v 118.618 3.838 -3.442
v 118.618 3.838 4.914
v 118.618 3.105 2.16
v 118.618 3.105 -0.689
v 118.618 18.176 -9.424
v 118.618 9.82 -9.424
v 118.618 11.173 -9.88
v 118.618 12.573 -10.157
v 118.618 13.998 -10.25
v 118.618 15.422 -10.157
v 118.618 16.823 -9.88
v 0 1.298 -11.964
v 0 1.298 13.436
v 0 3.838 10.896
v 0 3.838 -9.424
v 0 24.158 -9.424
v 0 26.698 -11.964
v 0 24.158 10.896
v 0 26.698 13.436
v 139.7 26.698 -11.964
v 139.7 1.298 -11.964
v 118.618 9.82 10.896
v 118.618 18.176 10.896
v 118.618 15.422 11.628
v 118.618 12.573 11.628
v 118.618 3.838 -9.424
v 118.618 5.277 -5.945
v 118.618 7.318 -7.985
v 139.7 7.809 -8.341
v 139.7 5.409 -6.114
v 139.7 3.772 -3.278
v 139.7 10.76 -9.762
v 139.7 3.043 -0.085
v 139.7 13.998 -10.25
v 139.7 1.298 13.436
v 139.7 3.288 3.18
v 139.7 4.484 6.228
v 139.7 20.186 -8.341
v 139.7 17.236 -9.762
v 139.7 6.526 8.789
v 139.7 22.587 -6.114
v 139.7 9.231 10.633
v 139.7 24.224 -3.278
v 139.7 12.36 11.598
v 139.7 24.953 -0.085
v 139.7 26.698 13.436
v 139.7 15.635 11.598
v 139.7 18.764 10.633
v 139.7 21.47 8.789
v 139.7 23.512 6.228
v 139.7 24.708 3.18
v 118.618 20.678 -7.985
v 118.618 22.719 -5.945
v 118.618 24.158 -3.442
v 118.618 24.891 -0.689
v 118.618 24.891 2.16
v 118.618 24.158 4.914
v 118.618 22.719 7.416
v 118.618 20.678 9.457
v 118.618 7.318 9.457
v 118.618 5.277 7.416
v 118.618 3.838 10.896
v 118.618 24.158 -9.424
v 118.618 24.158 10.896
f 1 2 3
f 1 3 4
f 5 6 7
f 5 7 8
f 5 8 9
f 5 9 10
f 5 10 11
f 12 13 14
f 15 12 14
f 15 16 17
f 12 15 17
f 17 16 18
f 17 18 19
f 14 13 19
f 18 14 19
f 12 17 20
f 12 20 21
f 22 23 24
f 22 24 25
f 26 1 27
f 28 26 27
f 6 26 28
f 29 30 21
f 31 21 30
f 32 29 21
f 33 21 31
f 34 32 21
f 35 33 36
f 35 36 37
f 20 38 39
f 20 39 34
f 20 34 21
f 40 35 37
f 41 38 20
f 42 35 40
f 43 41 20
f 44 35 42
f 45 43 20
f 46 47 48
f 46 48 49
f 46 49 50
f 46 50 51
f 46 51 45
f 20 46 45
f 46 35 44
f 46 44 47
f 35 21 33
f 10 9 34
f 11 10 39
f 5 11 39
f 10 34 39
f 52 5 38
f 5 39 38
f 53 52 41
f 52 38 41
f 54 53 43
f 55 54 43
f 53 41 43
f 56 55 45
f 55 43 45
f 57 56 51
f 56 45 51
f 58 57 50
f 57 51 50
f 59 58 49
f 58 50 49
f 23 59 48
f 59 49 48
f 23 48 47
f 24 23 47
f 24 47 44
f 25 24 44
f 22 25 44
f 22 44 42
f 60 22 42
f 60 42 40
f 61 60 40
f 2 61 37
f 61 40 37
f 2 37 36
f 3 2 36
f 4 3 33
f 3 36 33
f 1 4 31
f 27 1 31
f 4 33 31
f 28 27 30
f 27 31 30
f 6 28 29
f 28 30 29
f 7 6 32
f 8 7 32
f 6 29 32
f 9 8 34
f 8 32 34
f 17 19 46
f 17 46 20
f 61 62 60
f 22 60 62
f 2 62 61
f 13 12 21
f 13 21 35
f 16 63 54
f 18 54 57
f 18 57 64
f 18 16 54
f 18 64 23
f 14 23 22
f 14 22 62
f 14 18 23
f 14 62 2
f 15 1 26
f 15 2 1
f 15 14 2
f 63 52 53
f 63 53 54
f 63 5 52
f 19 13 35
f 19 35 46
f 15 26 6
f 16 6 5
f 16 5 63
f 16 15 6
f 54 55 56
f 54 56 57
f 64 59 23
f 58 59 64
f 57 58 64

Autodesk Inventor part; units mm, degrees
ref_plane "YZ Plane" through (0, 0, 0) normal (1, 0, 0) x (0, 1, 0)
ref_plane "XZ Plane" through (0, 0, 0) normal (0, 1, 0) x (-1, 0, 0)
ref_plane "XY Plane" through (0, 0, 0) normal (0, 0, 1) x (1, 0, 0)
sketch "Sketch1" plane through (0, 0, 0) normal (1, 0, 0) x (0, 1, 0)
  line L0 (1.2978, 13.4356) -> (26.6978, 13.4356)
  line L1 (26.6978, 13.4356) -> (26.6978, -11.9644)
  line L2 (26.6978, -11.9644) -> (1.2978, -11.9644)
  line L3 (1.2978, -11.9644) -> (1.2978, 13.4356)
  line L4 (24.1578, -9.4244) -> (24.1578, 10.8956)
  line L5 (24.1578, 10.8956) -> (3.8378, 10.8956)
  line L6 (3.8378, 10.8956) -> (3.8378, -9.4244)
  line L7 (3.8378, -9.4244) -> (24.1578, -9.4244)
  point P0 (0, 0)
  dimension "d0" = 25.4
  dimension "d1" = 25.4
  dimension "d2" = 2.54
extrude "Extrusion1" add sketch "Sketch1" along normal blind 139.7
sketch "Sketch2" plane through (0, 3.8378, -9.4244) normal (0, 0, 1) x (1, 0, 0)
  line L0 (0, 0) -> (139.7, 0) projected
  line L1 (139.7, 0) -> (118.618, 0)
  line L2 (118.618, 0) -> (118.618, 20.32)
  line L3 (118.618, 20.32) -> (139.7, 20.32)
  line L4 (139.7, 20.32) -> (139.7, 0)
  point P0 (0, -3.8378)
  dimension "d5" = 21.082
  dimension "d6" = 20.32
extrude "Extrusion2" add sketch "Sketch2" along normal blind 20.32
sketch "Sketch3" plane through (139.7, 0, 0) normal (1, 0, 0) x (0, 0, -1)
  line L0 (11.9644, 1.2978) -> (-13.4356, 1.2978) projected
  line L1 (-0.7356, 1.2978) -> (-0.7356, 13.9978)
  line L2 (-13.4356, 26.6978) -> (11.9644, 26.6978) projected
  circle A0 centre (-0.7356, 13.9978) radius 10.9855
  point P0 (0, 0)
  dimension "d9" = 12.7
  dimension "d10" = 21.971
extrude "Extrusion3" cut sketch "Sketch3" against normal blind 21.082
thread "Thread1" size "M22x1.5" class "6H" standard "ANSI Metric M Profile" full length
properties part number "2nd arm"
